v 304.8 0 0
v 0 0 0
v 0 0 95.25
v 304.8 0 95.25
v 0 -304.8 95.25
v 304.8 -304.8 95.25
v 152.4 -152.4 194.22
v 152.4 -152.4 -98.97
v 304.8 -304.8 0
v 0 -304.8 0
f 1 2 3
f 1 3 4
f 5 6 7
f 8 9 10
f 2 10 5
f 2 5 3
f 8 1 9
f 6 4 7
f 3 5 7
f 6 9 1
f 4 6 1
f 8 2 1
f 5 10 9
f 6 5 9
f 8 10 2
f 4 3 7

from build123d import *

# Parameters (mm, degrees)
F0_W       = 304.8
F0_H       = 304.8
F1_DEPTH   = 95.25
F1_FACE_W  = 304.8
F1_FACE_H  = 304.8
F2_DEPTH   = 101.6
F2_TAPER   = 57
F1_FACE1_W = 304.8
F1_FACE1_H = 304.8


# Not quite as in the source:
# - an extrude whose draft closes it to a point is written as a loft to that point


with BuildPart() as f1:
    # F0 (on Top) → F1 (new body)
    with BuildSketch(Plane.XY):
        with Locations((152.4, -152.4)):
            Rectangle(F0_W, F0_H)
    extrude(amount=F1_DEPTH)

    # F1_face (on face) → F2 (join)
    with BuildSketch(Plane(origin=(152.4, -152.4, 95.25), x_dir=(1, 0, 0), z_dir=(0, 0, 1))):
        Rectangle(F1_FACE_W, F1_FACE_H)
    extrude(amount=F2_DEPTH, taper=F2_TAPER)

    # F1_face1 (on face) → F3 section 0
    with BuildSketch(Plane(origin=(152.4, -152.4, 0), x_dir=(1, 0, 0), z_dir=(0, 0, -1)), mode=Mode.PRIVATE) as f3_s0:
        Rectangle(F1_FACE1_W, F1_FACE1_H)
    loft([f3_s0.sketch, Vertex(152.4, -152.4, -98.9697172033)], ruled=True)


solid = f1.part
